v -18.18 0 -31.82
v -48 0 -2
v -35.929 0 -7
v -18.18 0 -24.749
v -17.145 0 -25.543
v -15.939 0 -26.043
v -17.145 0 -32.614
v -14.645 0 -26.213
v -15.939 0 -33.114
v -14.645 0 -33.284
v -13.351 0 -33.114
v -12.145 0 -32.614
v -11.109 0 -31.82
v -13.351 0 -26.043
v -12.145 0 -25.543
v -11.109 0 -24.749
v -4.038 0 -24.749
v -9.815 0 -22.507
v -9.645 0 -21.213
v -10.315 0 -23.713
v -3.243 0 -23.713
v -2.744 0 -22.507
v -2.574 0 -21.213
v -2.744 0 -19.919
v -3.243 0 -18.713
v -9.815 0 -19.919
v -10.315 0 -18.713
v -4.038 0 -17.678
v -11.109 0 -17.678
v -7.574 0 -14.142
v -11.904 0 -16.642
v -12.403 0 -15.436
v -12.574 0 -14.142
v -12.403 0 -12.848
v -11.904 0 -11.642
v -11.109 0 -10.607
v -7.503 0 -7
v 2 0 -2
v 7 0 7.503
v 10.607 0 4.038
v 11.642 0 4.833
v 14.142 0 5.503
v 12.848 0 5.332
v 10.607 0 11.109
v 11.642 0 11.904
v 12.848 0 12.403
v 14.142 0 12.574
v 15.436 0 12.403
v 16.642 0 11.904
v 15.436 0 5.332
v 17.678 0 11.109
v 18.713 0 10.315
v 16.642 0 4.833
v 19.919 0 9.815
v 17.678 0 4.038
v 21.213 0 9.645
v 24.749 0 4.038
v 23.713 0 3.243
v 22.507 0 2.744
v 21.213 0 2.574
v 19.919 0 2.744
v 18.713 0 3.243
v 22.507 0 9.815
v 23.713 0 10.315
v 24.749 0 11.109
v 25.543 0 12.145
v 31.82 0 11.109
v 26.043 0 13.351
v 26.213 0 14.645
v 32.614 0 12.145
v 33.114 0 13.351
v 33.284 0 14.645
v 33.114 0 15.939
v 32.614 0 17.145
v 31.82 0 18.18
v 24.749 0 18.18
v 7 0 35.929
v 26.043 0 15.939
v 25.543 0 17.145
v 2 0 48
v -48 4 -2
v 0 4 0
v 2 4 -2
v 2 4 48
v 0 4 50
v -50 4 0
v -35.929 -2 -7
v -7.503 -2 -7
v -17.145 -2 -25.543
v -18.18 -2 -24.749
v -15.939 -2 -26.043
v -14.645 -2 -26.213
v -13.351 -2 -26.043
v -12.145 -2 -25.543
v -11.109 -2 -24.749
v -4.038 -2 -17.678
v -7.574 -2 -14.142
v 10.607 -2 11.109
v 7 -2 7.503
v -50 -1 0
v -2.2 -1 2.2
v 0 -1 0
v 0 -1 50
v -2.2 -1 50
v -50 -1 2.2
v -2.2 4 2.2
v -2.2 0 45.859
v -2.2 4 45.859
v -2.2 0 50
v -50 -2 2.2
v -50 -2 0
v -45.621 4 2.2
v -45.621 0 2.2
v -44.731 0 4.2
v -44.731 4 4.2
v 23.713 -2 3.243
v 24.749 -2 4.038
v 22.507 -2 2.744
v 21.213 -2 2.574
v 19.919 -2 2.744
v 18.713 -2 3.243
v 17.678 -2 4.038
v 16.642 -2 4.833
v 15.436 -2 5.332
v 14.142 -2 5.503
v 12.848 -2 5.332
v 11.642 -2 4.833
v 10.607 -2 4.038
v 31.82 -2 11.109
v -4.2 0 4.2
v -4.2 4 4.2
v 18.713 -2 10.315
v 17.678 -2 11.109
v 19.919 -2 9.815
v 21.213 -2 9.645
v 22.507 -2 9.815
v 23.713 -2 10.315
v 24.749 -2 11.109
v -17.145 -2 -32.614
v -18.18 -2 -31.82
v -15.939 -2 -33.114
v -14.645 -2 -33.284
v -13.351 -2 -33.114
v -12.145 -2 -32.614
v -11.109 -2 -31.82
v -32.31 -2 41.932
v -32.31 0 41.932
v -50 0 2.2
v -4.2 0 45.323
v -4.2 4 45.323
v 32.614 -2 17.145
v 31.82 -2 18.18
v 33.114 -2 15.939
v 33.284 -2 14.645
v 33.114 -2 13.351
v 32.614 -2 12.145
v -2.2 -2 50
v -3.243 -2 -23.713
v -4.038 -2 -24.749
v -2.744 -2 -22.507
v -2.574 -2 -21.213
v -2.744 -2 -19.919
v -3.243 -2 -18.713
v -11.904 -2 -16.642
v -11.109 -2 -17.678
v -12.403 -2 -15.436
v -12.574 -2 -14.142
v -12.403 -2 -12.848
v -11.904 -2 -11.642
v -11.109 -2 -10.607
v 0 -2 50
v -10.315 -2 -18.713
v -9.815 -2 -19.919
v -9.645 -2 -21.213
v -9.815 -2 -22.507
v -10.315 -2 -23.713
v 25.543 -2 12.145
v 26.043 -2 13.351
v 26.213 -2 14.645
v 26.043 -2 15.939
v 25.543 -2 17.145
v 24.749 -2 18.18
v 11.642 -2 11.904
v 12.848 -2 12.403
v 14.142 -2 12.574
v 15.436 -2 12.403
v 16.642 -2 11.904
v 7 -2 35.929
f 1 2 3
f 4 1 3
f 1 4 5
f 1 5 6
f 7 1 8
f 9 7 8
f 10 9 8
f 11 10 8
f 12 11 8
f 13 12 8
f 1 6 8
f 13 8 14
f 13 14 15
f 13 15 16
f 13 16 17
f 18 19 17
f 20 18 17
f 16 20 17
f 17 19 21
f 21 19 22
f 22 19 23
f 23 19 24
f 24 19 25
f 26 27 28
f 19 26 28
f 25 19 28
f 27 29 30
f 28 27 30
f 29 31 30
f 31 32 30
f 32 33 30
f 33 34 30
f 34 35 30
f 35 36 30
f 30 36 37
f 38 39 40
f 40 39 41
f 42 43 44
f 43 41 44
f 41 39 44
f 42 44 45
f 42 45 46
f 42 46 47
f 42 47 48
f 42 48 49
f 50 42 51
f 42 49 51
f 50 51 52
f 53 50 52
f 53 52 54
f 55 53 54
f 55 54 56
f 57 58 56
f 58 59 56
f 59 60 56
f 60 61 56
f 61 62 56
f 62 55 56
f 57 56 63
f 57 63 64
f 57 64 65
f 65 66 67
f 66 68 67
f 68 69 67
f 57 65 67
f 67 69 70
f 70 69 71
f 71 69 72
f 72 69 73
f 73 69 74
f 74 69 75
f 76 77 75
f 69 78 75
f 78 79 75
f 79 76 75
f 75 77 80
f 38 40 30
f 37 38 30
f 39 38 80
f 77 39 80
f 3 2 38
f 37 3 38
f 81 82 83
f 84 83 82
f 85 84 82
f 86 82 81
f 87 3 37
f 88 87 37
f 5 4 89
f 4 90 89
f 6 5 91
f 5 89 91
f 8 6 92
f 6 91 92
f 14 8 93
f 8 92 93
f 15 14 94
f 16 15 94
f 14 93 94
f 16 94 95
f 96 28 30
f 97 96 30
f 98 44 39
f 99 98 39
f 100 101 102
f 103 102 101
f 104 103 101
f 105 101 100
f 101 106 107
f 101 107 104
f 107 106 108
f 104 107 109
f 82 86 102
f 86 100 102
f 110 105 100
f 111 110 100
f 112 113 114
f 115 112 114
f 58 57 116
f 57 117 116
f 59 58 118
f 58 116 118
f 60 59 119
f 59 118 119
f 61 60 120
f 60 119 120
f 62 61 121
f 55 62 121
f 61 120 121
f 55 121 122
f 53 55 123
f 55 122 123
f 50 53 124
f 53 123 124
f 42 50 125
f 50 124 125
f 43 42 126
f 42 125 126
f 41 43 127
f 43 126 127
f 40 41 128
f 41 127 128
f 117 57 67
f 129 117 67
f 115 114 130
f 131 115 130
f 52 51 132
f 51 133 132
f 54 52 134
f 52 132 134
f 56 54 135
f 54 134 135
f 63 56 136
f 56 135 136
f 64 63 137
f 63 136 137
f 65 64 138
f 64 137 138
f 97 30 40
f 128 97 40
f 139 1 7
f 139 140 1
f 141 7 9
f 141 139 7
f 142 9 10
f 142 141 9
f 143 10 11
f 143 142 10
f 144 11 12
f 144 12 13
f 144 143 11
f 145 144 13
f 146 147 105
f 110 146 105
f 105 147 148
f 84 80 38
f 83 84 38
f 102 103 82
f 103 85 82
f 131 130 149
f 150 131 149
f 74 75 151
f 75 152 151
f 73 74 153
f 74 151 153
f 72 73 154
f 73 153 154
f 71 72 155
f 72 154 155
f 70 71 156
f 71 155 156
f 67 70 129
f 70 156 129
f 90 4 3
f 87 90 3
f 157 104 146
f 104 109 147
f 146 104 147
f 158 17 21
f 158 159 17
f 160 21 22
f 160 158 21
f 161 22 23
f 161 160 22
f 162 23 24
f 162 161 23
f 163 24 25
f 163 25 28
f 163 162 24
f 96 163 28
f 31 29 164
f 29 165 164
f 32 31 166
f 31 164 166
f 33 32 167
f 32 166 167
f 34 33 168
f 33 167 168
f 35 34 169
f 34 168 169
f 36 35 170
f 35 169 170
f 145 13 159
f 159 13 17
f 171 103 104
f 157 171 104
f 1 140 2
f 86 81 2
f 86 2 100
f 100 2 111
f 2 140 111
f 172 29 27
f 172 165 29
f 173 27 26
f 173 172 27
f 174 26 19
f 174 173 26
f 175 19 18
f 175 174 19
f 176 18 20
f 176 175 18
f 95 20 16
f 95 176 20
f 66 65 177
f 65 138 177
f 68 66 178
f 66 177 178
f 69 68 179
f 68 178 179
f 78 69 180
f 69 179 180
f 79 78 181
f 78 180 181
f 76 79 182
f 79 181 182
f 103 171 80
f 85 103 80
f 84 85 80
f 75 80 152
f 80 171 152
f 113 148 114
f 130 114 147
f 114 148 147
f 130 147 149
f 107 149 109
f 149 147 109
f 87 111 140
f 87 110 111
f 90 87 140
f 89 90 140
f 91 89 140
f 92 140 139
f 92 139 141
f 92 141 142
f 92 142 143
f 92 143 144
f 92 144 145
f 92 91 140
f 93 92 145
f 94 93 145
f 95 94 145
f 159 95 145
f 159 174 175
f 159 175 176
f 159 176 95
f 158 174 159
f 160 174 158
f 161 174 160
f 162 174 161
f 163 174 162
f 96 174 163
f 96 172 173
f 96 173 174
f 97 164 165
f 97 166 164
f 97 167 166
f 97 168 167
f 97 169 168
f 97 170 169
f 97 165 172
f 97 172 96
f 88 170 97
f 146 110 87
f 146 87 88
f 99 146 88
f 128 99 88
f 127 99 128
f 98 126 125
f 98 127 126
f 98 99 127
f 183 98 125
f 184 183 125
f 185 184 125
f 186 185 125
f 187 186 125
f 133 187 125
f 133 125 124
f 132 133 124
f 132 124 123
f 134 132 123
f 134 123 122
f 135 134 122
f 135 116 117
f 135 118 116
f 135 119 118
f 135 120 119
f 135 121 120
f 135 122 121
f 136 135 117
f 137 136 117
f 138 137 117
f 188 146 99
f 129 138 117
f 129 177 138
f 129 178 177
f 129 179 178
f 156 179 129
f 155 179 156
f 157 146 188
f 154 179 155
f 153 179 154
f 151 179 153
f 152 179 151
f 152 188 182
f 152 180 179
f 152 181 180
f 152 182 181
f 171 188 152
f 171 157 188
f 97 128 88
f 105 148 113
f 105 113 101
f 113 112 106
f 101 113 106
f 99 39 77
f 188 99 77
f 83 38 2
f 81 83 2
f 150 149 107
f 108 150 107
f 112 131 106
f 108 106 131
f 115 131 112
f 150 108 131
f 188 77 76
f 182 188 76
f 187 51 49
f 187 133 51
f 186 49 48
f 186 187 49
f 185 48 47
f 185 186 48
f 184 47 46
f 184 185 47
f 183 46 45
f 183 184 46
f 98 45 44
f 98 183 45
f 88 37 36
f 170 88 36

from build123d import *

# Parameters (mm, degrees)
F1_DEPTH = 2
F3_DEPTH = 4
F5_DEPTH = 25
F6_R     = 4.99999
F8_DEPTH = 1


# Not quite as in the source:
# - a fillet or chamfer is up to 0.001 mm smaller than in the source, because OpenCascade refuses the exact size


with BuildPart() as f1:
    # F0 (on Front) → F1 (new body)
    with BuildSketch(Plane.XZ):
        Polygon((-50, 2.2), (-50, 0), (-14.6446609407, -35.3553390593), (-0.5025253169, -21.2132034356), (-7.5735931288, -14.1421356237), (14.1421356237, 7.5735931288), (21.2132034356, 0.5025253169), (35.3553390593, 14.6446609407), (0, 50), (-2.2, 50), (-2.2, 2.2), align=None)
        Polygon((-32.3101722444, 41.9320036632), (-50, 2.2), (-2.2, 2.2), (-2.2, 50), align=None)
    extrude(amount=F1_DEPTH)

    # F2 (on face) → F3 (join)
    with BuildSketch(Plane(origin=(0, 0, 0), x_dir=(-1, 0, 0), z_dir=(0, 1, 0))):
        Polygon((0, 0), (0, 50), (-2, 48), (-2, -2), (48, -2), (50, 0), align=None)
        Polygon((4.2, 45.3229968935), (2.2, 45.8588952784), (2.2, 2.2), (45.621454886, 2.2), (44.7309975154, 4.2), (4.2, 4.2), align=None)
    extrude(amount=F3_DEPTH)

    # F4 (on face) → F5 (cut)
    with BuildSketch(Plane(origin=(0, 0, 0), x_dir=(-1, 0, 0), z_dir=(0, 1, 0))):
        Polygon((7.5735934344, -21.2132034356), (14.6446609407, -28.2842709419), (35.9289316665, -7.0000002161), (7.5025258386, -7.0000002161), (14.6446612462, -14.1421356237), align=None)
        Polygon((-14.1421356237, 14.6446612462), (-7.0000002161, 7.5025258386), (-7.0000002161, 35.9289316665), (-28.2842709419, 14.6446609407), (-21.2132034356, 7.5735934344), align=None)
    extrude(amount=-F5_DEPTH, mode=Mode.SUBTRACT)

    # F6 (radius 5 in the source; OpenCascade refuses exactly that, so slightly less here)
    f6_edges = [f1.edges().sort_by_distance(p)[0] for p in [
        (35.355339, -1, 14.644661),
        (21.213203, -1, 0.502525),
        (-14.644661, -1, -35.355339),
        (-0.502525, -1, -21.213203),
        (-14.644661, -1, -14.142136),
        (14.142136, -1, 14.644661),
        (14.142136, -1, 7.573593),
        (21.213203, -1, 7.573593),
        (28.284271, -1, 14.644661),
        (-14.644661, -1, -28.284271),
        (-7.573593, -1, -21.213203),
    ]]
    fillet(f6_edges, radius=F6_R)

    # F7 (on face) → F8 (cut)
    with BuildSketch(Plane(origin=(0, 0, 0), x_dir=(-1, 0, 0), z_dir=(0, 1, 0))):
        Polygon((2.2, 50), (0, 50), (0, 0), (50, 0), (50, 2.2), (45.621454886, 2.2), (2.2, 2.2), (2.2, 45.8588952784), align=None)
    extrude(amount=-F8_DEPTH, mode=Mode.SUBTRACT)


solid = f1.part
